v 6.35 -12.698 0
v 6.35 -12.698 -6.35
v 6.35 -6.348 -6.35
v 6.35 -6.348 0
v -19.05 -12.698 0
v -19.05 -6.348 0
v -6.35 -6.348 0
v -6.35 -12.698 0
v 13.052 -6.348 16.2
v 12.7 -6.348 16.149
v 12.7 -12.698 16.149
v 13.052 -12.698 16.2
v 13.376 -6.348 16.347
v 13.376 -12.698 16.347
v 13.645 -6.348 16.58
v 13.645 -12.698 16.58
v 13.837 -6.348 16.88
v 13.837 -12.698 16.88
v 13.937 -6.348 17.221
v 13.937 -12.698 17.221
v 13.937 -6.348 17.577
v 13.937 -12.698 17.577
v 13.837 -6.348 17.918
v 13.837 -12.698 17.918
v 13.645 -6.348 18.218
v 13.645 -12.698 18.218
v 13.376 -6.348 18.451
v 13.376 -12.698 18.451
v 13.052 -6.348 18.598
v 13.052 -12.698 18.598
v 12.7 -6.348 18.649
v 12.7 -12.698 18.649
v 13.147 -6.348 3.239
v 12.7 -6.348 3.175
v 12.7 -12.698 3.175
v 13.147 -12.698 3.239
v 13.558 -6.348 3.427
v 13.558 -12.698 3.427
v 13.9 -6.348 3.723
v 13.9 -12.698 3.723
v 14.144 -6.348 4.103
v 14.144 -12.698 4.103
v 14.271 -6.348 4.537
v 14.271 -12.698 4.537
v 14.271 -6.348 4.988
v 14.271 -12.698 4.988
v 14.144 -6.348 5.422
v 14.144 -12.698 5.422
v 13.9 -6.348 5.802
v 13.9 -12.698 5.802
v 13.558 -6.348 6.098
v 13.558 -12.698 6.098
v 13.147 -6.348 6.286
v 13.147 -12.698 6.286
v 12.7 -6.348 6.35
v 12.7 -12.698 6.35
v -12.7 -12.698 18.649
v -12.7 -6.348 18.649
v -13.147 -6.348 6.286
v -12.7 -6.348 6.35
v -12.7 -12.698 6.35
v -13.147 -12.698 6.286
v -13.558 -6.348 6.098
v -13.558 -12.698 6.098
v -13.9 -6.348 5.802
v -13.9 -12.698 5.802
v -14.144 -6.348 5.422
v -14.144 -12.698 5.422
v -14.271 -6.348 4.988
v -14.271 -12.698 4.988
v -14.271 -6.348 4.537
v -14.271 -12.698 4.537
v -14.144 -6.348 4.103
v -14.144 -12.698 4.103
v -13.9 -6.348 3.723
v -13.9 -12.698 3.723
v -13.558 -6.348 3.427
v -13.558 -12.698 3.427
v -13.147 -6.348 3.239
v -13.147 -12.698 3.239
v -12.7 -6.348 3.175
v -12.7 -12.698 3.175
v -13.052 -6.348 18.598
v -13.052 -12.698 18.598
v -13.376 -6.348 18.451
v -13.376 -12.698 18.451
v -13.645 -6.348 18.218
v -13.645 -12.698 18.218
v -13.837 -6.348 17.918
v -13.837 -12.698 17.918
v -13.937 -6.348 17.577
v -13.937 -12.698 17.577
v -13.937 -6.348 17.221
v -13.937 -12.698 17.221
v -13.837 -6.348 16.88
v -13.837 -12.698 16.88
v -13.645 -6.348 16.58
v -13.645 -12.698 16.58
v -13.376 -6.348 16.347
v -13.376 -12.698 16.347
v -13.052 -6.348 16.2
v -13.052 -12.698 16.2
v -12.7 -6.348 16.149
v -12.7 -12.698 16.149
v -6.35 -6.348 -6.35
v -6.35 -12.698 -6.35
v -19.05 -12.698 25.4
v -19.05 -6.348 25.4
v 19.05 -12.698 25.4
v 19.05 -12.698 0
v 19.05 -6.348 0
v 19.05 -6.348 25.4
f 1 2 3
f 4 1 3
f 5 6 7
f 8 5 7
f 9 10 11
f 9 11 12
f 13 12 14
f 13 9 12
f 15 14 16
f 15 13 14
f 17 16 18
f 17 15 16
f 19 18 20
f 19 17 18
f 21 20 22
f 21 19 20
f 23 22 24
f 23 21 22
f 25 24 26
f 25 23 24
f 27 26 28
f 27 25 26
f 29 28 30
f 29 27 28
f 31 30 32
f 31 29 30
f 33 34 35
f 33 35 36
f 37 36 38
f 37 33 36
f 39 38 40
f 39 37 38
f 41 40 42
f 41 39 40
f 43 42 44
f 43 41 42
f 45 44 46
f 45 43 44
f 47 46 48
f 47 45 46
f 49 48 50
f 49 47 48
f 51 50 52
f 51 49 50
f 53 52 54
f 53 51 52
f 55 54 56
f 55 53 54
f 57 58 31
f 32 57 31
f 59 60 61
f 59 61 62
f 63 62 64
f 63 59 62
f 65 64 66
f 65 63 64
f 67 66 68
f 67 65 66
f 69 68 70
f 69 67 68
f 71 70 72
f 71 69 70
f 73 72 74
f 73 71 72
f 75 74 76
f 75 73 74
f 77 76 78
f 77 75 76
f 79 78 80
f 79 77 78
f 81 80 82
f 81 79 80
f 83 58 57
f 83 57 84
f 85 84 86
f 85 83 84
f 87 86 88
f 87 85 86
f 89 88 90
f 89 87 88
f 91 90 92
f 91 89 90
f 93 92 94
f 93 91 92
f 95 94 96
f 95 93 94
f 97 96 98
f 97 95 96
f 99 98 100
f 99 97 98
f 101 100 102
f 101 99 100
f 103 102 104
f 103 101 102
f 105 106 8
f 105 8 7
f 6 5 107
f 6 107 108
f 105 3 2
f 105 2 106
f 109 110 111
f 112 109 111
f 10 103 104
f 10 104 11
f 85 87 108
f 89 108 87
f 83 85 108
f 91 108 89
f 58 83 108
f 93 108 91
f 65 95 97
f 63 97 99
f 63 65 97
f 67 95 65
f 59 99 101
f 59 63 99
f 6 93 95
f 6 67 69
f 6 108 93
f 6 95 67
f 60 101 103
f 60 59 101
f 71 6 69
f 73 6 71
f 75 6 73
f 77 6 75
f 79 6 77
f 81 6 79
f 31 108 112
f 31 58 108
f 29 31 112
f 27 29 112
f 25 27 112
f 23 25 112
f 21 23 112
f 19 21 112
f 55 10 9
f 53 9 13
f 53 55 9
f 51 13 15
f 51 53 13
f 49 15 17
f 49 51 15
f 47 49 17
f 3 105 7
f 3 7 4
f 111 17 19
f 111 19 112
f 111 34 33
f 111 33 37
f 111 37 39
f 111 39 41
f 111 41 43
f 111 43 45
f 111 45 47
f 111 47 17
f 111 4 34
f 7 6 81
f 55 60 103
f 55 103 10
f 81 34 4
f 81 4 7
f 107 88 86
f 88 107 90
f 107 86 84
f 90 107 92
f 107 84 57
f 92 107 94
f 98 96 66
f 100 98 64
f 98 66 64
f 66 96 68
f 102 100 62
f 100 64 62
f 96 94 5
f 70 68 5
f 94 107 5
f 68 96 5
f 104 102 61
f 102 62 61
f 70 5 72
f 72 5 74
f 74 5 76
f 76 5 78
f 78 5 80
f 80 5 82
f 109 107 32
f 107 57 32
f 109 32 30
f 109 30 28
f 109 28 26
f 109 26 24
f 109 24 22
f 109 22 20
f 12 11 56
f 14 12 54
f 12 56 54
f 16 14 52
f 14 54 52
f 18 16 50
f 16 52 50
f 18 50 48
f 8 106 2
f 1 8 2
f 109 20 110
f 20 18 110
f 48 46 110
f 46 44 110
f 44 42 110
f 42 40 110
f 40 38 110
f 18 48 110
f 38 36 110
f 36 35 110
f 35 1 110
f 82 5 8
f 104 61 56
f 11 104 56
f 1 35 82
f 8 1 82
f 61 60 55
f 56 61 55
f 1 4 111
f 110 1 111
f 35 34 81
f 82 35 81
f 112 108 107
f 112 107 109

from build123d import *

# Parameters (mm, degrees)
SKETCH1_W           = 38.1
SKETCH1_H           = 6.35
BOSS_EXTRUDE1_DEPTH = 25.4
SKETCH2_W           = 25.4
SKETCH2_H           = 2.5
CUT_EXTRUDE1_DEPTH  = 33.378773911
SKETCH3_W           = 12.7
SKETCH3_H           = 6.35
BOSS_EXTRUDE4_DEPTH = 6.35
SKETCH4_W           = 12.7
SKETCH4_H           = 3.175
CUT_EXTRUDE2_DEPTH  = 10


with BuildPart() as part:
    # Sketch1 → Boss-Extrude1 (new body)
    with BuildSketch(Plane.XY):
        with Locations((0, -9.523336827)):
            Rectangle(SKETCH1_W, SKETCH1_H)
    extrude(amount=BOSS_EXTRUDE1_DEPTH)

    # Sketch2 → Cut-Extrude1 (cut, through all)
    with BuildSketch(Plane(origin=(0, -6.348336827, 0), x_dir=(1, 0, 0), z_dir=(0, 1, 0))):
        with Locations((0, -17.399)):
            Rectangle(SKETCH2_W, SKETCH2_H)
        with BuildLine():
            Line((12.7, -18.649), (12.7, -16.149))
            ThreePointArc((12.7, -16.149), (13.95, -17.399), (12.7, -18.649))
        make_face()
        with BuildLine():
            ThreePointArc((-12.7, -18.649), (-13.95, -17.399), (-12.7, -16.149))
            Line((-12.7, -16.149), (-12.7, -18.649))
        make_face()
    extrude(amount=-CUT_EXTRUDE1_DEPTH, mode=Mode.SUBTRACT)

    # Sketch3 → Boss-Extrude4 (add)
    with BuildSketch(Plane(origin=(0, 0, 0), x_dir=(-1, 0, 0), z_dir=(0, 0, -1))):
        with Locations((0, -9.523336827)):
            Rectangle(SKETCH3_W, SKETCH3_H)
    extrude(amount=BOSS_EXTRUDE4_DEPTH)

    # Sketch4 → Cut-Extrude2 (cut)
    with BuildSketch(Plane(origin=(0, -6.348336827, 0), x_dir=(1, 0, 0), z_dir=(0, 1, 0))):
        with Locations((-6.35, -4.7625)):
            Rectangle(SKETCH4_W, SKETCH4_H)
        with BuildLine():
            ThreePointArc((-12.7, -6.35), (-14.2875, -4.7625), (-12.7, -3.175))
            Line((-12.7, -3.175), (-12.7, -6.35))
        make_face()
        with Locations((6.35, -4.7625)):
            Rectangle(SKETCH4_W, SKETCH4_H)
        with BuildLine():
            Line((12.7, -6.35), (12.7, -3.175))
            ThreePointArc((12.7, -3.175), (14.2875, -4.7625), (12.7, -6.35))
        make_face()
    extrude(amount=-CUT_EXTRUDE2_DEPTH, mode=Mode.SUBTRACT)


solid = part.part
